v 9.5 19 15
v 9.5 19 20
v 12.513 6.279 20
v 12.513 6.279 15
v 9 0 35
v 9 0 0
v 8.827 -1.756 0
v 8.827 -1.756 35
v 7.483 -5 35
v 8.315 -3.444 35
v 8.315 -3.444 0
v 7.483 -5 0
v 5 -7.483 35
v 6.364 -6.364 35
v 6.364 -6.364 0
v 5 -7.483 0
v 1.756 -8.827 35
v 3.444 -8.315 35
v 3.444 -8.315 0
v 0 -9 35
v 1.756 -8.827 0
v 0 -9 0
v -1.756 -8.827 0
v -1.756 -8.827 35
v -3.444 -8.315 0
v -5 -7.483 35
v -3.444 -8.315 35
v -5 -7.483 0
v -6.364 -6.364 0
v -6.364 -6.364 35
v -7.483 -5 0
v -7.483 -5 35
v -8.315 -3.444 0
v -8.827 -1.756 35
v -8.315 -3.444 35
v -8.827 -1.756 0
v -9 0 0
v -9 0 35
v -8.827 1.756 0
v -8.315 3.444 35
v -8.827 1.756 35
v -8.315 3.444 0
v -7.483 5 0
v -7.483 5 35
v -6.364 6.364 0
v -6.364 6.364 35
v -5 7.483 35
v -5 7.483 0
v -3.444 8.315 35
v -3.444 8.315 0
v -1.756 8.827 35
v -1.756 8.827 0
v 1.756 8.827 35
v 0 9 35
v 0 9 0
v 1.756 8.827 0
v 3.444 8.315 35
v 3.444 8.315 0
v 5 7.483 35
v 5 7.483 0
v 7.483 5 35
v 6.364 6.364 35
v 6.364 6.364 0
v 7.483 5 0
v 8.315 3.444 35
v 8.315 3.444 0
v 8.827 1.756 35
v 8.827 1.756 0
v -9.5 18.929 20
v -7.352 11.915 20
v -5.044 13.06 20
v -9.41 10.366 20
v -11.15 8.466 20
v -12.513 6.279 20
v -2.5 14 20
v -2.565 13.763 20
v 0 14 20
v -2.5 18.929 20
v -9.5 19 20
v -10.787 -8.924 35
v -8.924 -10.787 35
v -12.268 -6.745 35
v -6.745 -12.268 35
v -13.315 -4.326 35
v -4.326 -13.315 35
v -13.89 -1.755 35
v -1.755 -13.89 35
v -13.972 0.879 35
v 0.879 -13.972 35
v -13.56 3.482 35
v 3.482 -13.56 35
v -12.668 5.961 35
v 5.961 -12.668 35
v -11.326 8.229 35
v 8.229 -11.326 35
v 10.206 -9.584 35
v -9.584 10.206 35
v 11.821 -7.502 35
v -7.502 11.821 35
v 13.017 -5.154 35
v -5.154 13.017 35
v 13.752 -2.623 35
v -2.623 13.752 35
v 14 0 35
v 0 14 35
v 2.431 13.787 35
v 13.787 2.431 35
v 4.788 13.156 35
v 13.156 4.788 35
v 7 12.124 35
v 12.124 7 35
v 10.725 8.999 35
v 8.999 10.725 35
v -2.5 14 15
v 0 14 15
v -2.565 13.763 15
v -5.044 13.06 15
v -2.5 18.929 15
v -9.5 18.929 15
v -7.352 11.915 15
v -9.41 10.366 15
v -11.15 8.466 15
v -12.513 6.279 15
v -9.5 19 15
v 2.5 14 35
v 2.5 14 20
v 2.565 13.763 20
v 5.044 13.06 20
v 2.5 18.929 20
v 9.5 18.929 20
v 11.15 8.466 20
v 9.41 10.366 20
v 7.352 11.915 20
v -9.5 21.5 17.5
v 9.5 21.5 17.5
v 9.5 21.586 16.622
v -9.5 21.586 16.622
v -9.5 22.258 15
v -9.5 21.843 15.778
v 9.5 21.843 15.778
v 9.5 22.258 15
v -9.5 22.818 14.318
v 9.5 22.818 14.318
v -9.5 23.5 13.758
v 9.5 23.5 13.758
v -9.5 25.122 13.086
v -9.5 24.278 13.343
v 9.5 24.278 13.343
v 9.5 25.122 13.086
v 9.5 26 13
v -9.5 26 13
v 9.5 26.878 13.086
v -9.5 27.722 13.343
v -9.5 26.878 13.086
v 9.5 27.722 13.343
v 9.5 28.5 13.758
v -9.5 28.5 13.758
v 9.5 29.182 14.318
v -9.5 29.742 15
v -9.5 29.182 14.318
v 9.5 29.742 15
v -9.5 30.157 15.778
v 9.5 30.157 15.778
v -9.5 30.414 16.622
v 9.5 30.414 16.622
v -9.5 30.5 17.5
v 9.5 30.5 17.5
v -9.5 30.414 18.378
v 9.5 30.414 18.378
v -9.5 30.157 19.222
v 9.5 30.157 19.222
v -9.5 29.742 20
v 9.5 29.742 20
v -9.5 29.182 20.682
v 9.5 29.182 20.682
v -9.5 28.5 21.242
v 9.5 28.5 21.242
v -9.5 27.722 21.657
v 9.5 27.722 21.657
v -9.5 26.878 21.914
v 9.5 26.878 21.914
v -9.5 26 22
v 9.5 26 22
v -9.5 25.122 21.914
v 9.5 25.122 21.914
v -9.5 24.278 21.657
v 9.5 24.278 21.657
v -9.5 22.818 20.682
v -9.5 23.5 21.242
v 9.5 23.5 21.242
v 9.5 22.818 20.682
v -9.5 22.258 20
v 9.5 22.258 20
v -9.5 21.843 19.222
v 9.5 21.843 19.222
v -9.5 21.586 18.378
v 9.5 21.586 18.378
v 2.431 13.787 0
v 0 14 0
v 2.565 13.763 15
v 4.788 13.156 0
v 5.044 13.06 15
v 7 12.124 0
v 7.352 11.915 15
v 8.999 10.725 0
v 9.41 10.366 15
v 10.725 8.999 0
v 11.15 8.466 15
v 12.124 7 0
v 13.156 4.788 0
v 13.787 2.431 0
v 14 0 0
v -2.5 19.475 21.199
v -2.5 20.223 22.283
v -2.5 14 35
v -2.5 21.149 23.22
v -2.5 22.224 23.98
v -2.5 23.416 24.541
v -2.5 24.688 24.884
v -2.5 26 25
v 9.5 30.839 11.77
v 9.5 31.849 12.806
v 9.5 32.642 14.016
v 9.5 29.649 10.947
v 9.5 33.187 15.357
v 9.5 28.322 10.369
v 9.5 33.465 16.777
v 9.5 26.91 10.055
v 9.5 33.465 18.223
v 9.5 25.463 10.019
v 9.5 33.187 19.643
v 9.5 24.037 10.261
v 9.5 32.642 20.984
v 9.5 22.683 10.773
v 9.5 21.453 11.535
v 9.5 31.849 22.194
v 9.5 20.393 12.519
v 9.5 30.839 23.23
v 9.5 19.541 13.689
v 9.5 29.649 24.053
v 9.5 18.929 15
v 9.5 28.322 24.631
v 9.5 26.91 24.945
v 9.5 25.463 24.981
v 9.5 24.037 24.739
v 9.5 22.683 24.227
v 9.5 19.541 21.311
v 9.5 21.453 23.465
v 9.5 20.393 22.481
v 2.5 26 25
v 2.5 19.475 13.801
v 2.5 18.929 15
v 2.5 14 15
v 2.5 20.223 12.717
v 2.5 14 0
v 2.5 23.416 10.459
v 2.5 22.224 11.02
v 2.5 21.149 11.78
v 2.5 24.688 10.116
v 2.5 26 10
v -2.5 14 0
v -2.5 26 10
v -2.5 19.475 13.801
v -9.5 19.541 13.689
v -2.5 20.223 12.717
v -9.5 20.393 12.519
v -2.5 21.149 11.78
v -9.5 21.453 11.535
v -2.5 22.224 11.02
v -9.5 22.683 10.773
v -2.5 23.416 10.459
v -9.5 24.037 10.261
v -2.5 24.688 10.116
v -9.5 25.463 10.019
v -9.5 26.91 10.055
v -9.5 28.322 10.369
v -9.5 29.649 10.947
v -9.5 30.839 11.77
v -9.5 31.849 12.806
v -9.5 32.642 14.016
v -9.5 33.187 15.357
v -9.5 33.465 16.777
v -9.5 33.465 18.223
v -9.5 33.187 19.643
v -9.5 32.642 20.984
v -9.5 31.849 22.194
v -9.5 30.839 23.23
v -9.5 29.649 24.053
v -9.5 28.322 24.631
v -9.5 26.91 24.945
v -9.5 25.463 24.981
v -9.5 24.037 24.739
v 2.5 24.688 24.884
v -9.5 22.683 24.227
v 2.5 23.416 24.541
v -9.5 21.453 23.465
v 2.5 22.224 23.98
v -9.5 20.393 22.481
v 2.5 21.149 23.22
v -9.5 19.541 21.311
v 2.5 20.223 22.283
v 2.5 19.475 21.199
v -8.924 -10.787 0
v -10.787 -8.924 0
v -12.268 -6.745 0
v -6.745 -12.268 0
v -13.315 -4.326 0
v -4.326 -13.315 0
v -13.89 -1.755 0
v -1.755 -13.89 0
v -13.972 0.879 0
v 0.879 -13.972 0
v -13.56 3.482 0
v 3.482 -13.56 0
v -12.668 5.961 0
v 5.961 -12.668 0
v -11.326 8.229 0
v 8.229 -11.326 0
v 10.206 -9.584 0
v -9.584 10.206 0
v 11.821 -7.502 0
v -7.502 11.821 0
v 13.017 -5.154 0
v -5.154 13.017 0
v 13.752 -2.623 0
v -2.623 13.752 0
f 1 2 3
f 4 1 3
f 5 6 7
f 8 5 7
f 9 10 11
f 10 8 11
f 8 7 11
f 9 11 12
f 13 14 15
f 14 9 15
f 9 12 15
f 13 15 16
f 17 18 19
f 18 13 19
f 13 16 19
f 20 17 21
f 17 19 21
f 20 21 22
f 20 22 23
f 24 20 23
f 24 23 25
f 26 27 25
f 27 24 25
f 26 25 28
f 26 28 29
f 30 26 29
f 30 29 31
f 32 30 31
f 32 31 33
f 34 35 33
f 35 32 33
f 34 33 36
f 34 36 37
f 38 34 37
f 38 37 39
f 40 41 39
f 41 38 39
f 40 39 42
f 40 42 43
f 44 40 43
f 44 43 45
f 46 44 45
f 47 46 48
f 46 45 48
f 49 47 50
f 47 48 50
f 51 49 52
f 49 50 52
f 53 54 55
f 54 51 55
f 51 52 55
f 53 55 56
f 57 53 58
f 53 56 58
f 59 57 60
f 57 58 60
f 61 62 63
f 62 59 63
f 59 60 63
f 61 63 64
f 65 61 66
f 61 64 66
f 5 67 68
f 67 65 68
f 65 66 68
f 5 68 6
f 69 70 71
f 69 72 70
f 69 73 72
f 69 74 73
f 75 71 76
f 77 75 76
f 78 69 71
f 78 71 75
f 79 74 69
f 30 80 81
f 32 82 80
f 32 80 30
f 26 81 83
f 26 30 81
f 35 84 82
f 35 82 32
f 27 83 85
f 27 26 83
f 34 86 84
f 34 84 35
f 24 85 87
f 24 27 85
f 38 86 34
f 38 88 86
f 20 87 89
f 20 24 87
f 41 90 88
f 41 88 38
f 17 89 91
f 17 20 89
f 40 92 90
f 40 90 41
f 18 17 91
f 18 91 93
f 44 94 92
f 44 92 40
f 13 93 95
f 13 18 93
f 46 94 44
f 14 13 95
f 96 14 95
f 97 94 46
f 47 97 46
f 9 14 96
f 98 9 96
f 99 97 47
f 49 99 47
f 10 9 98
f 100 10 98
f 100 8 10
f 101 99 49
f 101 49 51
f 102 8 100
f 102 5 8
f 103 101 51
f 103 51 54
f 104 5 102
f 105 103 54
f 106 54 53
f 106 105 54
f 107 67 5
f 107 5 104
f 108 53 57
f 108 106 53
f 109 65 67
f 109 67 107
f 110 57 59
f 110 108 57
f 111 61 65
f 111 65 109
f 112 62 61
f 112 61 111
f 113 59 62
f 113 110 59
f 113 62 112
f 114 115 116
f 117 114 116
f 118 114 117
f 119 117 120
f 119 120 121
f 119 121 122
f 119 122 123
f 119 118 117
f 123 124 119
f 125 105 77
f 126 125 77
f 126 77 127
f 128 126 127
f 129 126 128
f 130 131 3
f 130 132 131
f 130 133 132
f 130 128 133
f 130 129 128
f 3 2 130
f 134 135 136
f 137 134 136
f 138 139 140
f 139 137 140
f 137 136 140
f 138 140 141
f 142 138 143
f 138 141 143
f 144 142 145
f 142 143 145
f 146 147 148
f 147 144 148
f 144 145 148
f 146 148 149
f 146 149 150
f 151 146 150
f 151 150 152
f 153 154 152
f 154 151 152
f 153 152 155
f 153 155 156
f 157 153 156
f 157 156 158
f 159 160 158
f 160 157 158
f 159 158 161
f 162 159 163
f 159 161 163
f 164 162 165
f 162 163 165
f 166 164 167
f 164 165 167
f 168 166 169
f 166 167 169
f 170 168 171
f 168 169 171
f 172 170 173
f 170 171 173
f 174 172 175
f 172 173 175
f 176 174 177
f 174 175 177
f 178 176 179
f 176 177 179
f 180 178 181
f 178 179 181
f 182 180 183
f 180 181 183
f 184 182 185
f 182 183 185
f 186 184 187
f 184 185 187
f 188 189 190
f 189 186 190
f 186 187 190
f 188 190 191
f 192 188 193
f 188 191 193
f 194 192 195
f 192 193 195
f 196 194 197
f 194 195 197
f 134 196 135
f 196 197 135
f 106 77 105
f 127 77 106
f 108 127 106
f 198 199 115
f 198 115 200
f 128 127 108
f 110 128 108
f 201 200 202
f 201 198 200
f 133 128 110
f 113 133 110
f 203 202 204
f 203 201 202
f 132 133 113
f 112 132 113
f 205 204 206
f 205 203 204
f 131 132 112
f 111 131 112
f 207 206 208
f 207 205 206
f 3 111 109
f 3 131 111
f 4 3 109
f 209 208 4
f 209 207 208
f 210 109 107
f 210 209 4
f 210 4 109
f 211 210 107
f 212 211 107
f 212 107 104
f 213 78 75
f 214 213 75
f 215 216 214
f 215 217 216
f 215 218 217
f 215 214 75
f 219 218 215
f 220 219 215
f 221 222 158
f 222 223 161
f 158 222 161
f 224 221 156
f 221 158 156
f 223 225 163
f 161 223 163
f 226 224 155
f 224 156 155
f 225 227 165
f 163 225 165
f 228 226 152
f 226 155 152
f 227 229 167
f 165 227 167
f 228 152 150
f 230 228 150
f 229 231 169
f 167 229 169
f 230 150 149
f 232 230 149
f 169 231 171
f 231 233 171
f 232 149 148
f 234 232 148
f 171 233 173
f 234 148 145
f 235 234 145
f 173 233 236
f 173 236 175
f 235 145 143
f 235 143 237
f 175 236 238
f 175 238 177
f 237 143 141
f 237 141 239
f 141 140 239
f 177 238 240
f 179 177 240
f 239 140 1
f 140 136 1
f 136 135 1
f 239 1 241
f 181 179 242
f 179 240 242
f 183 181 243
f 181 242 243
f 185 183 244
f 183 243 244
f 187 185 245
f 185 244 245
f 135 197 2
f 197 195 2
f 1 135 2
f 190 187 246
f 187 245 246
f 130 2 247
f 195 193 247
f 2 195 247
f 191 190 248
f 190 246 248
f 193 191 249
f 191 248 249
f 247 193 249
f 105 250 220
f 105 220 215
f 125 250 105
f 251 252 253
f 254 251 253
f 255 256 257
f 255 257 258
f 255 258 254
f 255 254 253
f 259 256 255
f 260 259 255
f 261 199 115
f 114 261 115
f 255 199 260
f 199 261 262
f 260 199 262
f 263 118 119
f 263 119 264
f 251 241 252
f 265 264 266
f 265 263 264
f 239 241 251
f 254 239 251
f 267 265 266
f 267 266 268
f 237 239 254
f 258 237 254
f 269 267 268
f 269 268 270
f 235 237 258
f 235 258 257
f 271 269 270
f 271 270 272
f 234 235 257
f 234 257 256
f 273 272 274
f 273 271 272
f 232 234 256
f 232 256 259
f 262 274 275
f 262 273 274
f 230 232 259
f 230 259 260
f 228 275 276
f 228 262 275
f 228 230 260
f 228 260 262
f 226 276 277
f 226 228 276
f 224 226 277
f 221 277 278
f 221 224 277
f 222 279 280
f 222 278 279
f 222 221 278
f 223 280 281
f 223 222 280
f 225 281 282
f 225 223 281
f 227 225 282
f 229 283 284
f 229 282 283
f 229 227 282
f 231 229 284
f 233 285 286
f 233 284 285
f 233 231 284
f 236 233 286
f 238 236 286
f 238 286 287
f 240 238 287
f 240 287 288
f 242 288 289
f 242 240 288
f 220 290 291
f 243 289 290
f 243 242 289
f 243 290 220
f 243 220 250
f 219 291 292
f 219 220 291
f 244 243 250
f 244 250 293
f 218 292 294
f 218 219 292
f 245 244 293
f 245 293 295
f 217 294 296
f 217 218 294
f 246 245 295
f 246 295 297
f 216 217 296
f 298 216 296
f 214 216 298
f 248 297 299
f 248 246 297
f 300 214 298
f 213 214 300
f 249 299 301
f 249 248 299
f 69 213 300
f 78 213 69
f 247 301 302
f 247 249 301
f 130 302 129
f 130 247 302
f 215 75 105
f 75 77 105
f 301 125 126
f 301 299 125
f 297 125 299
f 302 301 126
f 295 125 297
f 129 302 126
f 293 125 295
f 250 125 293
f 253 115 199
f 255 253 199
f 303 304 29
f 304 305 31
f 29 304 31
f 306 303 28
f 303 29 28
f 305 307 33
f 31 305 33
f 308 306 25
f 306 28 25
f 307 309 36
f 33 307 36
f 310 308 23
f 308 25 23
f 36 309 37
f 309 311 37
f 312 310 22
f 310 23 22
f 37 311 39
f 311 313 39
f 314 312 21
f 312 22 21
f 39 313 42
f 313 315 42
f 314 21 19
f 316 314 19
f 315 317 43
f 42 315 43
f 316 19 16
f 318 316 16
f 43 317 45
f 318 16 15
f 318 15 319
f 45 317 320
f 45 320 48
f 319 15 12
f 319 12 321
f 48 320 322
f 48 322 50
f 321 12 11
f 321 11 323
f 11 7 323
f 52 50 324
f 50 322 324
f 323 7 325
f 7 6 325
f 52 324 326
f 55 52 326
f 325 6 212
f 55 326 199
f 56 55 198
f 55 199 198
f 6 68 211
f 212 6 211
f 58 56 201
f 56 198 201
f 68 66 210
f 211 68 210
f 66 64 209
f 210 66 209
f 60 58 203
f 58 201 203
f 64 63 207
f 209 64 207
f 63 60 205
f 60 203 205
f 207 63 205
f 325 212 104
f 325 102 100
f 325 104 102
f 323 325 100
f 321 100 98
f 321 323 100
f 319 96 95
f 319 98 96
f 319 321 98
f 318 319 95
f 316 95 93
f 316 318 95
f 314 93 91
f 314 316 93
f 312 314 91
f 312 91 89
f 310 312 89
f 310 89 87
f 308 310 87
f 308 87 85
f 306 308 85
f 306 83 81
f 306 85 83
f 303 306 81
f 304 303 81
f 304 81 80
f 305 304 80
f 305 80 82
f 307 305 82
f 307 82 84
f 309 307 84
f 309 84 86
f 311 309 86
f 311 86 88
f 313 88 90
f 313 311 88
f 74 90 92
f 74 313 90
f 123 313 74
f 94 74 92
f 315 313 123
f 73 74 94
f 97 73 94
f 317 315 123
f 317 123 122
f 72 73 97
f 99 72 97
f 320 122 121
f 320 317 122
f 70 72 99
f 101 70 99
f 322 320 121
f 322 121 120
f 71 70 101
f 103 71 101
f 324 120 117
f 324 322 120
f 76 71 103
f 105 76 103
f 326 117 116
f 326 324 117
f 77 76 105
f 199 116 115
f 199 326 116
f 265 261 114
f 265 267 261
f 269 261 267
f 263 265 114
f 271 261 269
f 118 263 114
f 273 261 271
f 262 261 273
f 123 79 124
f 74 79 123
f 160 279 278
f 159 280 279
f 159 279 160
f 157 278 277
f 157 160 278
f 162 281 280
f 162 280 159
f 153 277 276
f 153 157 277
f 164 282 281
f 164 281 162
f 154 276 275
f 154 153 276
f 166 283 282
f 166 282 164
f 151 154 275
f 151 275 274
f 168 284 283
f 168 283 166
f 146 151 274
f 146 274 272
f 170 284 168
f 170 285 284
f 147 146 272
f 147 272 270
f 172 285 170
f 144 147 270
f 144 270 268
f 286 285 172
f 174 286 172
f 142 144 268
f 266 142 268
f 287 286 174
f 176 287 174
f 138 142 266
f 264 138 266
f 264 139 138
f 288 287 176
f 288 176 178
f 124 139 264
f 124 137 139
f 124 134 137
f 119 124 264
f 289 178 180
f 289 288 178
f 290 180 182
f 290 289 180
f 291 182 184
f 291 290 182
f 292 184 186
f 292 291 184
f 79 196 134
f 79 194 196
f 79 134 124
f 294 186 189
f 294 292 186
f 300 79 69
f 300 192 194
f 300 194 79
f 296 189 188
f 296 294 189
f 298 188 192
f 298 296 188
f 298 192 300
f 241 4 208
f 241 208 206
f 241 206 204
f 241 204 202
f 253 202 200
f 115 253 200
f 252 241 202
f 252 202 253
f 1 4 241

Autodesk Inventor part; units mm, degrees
ref_plane "YZ Plane" through (0, 0, 0) normal (1, 0, 0) x (0, 1, 0)
ref_plane "XZ Plane" through (0, 0, 0) normal (0, 1, 0) x (-1, 0, 0)
ref_plane "XY Plane" through (0, 0, 0) normal (0, 0, 1) x (1, 0, 0)
sketch "Sketch6" plane through (0, 0, 0) normal (0, 0, 1) x (1, 0, 0)
  circle A0 centre (0, 0) radius 9
  circle A1 centre (0, 0) radius 14
  dimension "d20" = 18
  dimension "d21" = 28
extrude "Extrusion4" add sketch "Sketch6" along normal blind 35
ref_plane "Work Plane2" through (0, 0, 17.5) normal (0, 0, 1) x (1, 0, 0)
sketch "Sketch8" plane through (0, 0, 17.5) normal (0, 0, 1) x (1, 0, 0)
  line L0 (0, 0) -> (0, 26)
  line L1 (0, 26) -> (-9.5, 26)
  line L2 (-9.5, 26) -> (-9.5, 21.5)
  line L3 (-9.5, 21.5) -> (0, 21.5)
  line L4 (0, 21.5) -> (0, 26)
  line L5 (0, 21.5) -> (-9.5, 21.5)
  line L6 (-9.5, 21.5) -> (-9.5, 18.5)
  line L7 (-9.5, 18.5) -> (0, 18.5)
  line L8 (0, 18.5) -> (0, 21.5)
  line L9 (9.5, 21.5) -> (0, 21.5)
  line L10 (9.5, 21.5) -> (9.5, 18.5)
  line L11 (9.5, 18.5) -> (0, 18.5)
  dimension "d28" = 26
  dimension "d29" = 9.5
  dimension "d30" = 4.5
  dimension "d32" = 3
revolve "Revolution1" add sketch "Sketch8" angle 360 about axis through (0, 26, 17.5) along (-1, 0, 0) contours L7 L6 L3 L0 | L0 L9 L10 L11
sketch "Sketch10" plane through (0, 0, 17.5) normal (0, 0, 1) x (1, 0, 0)
  circle A0 centre (0, 0) radius 14 projected
  line L0 (-14, 0) -> (-9.5, 19)
  line L1 (-9.5, 19) -> (0, 19)
  line L2 (-9.5, 33.5) -> (-9.5, 18.5) projected
  line L3 (0, 19) -> (0, 0)
  line L4 (14, 0) -> (9.5, 19)
  line L5 (9.5, 19) -> (0, 19)
  point P0 (-12.5128, 6.2793)
  point P1 (12.5128, 6.2793)
  dimension "d35" = 19
  dimension "d36" = 9.5
extrude "Extrusion6" add sketch "Sketch10" along normal blind 2.5 contours L0 L1 L3 A0 | A0 L3 L5 L4
mirror "Mirror2" about plane through (0, 0, 17.5) normal (0, 0, 1) of "Extrusion6"
ref_plane "Work Plane3" through (0, 59.1111, 15) normal (-1, 0, 0) x (0, 0, 1)
sketch "Sketch11" plane through (0, 59.1111, 15) normal (-1, 0, 0) x (0, 0, 1)
  arc A0 (5, -40.1822) -> (0, -40.1822) centre (2.5, -33.1111) ccw projected
  line L0 (-5, -33.1111) -> (-15, -45.1111)
  line L1 (-15, -45.1111) -> (20, -45.1111) projected
  circle A1 centre (2.5, -33.1111) radius 7.5
  line L2 (2.5, -33.1111) -> (2.5, -59.6944)
  line L3 (10, -33.1111) -> (20, -45.1111)
  point P0 (-15, -59.1111)
extrude "Extrusion7" add sketch "Sketch11" along normal blind 2.5 contours A0 L3 L1 L2 A1 | L2 L1 L0 A0 A1
mirror "Mirror3" about plane through (0, 59.1111, 15) normal (-1, 0, 0) of "Extrusion7"
